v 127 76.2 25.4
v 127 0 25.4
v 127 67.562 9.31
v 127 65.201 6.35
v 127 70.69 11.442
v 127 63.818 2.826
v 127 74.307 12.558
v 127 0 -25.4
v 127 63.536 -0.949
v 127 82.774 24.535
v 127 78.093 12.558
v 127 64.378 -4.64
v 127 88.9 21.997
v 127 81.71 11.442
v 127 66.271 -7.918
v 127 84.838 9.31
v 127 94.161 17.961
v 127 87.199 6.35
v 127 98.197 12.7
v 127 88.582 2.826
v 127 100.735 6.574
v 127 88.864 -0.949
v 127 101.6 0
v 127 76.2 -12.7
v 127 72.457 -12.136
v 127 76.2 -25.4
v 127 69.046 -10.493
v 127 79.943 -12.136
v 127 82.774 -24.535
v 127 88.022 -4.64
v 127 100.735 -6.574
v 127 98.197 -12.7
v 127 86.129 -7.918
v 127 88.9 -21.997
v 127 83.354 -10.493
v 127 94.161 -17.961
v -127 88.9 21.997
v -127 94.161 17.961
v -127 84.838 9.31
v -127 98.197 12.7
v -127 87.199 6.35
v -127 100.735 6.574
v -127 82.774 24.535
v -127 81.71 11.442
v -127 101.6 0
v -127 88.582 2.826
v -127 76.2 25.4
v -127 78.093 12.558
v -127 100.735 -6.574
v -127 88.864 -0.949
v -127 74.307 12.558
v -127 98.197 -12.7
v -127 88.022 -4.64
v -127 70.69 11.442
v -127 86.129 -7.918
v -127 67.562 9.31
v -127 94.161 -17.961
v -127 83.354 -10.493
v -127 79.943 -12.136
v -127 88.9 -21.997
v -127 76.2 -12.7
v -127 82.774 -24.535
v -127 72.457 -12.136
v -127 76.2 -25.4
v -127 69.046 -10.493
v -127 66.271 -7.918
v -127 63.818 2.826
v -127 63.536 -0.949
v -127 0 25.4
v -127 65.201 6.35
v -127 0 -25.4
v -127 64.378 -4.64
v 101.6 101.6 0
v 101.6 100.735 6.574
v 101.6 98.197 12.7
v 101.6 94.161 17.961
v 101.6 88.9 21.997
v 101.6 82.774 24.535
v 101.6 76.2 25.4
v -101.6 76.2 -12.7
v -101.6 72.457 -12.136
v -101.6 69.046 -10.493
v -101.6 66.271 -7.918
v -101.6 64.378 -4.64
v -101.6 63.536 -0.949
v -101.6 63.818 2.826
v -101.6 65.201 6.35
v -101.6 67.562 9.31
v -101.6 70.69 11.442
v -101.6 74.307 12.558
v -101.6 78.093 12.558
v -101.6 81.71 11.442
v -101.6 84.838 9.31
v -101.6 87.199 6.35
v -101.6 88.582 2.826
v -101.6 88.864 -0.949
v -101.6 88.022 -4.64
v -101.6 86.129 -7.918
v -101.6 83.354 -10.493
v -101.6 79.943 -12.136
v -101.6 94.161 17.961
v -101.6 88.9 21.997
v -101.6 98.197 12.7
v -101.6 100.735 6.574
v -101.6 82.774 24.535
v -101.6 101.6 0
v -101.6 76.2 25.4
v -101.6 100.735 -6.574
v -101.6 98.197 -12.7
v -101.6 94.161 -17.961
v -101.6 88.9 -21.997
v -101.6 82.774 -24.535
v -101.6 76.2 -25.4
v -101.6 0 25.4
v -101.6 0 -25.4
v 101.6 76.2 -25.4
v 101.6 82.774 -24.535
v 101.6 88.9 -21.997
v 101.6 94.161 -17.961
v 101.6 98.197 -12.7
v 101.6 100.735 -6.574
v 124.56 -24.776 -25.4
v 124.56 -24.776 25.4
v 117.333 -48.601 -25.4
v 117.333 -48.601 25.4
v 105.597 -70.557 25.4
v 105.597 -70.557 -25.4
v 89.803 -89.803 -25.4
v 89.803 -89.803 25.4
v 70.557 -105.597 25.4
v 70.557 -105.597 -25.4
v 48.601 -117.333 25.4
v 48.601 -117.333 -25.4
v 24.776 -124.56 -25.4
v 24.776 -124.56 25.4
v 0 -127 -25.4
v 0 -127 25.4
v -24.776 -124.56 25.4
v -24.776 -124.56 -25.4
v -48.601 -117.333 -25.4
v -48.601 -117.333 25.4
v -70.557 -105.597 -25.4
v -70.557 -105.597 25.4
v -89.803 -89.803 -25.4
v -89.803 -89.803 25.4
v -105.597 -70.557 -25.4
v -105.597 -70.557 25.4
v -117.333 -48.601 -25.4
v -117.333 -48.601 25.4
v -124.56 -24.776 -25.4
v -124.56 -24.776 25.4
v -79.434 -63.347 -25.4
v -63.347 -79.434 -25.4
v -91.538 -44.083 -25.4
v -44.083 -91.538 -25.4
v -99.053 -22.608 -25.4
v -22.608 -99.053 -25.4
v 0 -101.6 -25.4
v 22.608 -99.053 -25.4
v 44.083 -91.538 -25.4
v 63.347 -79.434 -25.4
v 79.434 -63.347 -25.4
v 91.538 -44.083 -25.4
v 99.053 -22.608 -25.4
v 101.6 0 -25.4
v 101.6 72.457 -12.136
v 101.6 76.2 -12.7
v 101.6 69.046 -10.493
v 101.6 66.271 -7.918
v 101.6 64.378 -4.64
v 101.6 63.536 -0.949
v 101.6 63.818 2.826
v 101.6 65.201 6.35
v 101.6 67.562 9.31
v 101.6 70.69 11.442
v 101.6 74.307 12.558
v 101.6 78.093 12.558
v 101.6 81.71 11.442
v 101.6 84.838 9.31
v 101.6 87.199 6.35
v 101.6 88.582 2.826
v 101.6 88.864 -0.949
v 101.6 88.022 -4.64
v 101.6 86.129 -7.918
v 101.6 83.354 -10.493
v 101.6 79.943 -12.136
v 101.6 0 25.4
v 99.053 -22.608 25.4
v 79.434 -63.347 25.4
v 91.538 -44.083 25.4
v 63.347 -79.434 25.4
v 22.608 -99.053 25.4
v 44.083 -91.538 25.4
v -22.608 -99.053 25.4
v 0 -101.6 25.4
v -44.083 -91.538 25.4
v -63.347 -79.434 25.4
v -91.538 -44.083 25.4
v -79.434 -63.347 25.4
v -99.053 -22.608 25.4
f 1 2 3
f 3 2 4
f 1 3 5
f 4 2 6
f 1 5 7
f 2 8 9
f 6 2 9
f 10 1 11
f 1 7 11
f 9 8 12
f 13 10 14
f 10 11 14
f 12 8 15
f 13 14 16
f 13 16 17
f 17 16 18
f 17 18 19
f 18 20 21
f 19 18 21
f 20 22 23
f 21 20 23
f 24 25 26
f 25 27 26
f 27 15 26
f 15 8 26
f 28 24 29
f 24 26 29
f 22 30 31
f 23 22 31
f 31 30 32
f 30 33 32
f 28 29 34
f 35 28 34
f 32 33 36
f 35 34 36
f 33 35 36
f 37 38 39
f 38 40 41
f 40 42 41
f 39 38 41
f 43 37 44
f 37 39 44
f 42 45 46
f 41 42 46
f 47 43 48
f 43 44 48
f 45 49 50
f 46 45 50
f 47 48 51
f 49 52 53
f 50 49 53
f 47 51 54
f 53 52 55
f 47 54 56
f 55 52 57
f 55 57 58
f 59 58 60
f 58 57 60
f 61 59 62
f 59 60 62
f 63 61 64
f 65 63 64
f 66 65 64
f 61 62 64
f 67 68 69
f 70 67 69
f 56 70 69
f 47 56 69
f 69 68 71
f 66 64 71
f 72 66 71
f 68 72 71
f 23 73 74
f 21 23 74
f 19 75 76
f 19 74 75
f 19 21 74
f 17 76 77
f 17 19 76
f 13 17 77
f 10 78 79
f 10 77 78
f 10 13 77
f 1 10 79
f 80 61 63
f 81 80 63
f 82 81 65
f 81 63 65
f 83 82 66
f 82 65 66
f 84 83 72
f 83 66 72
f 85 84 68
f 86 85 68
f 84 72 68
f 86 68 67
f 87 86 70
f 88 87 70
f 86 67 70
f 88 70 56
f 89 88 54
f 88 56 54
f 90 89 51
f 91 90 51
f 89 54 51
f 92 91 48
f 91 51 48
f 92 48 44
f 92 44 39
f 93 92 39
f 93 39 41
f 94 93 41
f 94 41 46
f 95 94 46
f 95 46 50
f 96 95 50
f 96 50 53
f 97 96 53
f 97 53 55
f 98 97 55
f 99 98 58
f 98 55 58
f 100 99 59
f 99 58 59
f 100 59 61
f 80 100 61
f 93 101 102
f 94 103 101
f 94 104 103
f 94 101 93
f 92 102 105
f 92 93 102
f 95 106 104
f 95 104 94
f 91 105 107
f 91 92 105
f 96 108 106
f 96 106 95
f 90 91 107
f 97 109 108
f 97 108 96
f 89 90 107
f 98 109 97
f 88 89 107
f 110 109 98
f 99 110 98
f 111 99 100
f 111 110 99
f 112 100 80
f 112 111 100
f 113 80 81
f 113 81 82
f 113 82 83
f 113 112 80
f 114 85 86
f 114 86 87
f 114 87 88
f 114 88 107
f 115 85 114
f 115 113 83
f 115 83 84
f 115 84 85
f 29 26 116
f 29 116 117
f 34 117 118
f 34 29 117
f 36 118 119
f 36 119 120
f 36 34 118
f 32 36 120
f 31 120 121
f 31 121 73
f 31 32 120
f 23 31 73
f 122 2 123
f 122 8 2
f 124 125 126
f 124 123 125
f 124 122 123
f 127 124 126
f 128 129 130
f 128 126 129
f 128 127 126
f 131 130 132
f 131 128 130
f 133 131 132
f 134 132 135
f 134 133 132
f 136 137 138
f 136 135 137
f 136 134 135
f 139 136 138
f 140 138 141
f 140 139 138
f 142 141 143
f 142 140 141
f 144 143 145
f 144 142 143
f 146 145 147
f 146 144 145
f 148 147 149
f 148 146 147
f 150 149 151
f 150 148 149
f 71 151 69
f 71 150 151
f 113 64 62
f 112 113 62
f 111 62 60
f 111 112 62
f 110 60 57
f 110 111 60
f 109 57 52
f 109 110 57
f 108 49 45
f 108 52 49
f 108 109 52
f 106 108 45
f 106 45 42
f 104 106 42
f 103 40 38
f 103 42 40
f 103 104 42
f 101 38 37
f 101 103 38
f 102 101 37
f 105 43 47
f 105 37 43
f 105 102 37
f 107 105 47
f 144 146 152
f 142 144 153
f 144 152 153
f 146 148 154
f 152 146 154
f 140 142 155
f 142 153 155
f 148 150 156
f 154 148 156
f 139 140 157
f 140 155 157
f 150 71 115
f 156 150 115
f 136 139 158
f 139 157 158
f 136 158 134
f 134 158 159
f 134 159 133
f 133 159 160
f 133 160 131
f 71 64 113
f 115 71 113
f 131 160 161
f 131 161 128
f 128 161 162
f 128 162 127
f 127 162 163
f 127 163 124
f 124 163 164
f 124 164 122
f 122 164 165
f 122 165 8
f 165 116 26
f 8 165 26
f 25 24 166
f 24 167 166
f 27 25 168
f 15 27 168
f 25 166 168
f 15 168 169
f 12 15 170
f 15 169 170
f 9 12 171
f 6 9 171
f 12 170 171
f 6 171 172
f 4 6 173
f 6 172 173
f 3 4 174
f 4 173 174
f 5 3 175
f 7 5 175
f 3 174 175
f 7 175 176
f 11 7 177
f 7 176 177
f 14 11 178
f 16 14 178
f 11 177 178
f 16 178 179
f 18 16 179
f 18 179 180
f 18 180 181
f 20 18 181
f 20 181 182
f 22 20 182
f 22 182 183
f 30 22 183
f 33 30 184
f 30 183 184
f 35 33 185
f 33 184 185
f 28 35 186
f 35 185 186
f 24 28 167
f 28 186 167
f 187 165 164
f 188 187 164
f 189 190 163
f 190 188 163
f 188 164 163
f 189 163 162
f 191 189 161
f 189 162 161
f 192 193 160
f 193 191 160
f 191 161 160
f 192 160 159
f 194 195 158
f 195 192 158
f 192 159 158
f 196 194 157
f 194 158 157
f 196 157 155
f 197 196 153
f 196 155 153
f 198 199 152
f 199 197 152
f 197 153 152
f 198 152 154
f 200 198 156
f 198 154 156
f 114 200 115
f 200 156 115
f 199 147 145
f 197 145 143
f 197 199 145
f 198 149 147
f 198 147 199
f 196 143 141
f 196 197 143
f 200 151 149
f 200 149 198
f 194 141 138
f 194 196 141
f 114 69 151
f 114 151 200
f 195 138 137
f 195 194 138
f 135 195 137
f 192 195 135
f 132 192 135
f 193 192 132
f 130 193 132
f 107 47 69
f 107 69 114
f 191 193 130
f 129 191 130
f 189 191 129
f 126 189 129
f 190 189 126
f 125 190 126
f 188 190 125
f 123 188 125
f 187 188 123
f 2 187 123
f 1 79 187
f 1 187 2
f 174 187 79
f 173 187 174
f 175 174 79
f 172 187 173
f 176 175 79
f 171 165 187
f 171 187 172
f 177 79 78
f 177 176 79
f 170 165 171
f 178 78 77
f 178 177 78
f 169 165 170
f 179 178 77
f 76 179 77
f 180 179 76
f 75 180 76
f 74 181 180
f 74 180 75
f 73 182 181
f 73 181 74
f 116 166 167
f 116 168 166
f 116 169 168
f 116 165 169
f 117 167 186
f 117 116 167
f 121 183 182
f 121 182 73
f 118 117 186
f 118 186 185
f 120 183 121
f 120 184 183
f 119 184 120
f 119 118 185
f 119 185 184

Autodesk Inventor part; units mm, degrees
ref_plane "YZ Plane" through (0, 0, 0) normal (1, 0, 0) x (0, 1, 0)
ref_plane "XZ Plane" through (0, 0, 0) normal (0, 1, 0) x (-1, 0, 0)
ref_plane "XY Plane" through (0, 0, 0) normal (0, 0, 1) x (1, 0, 0)
sketch "Sketch1" plane through (0, 0, 0) normal (0, 0, 1) x (1, 0, 0)
  line L0 (-101.6, 101.6) -> (-101.6, 0)
  arc A0 (-101.6, 0) -> (101.6, 0) centre (0, 0) ccw
  line L1 (101.6, 0) -> (101.6, 101.6)
  line L2 (-127, 101.6) -> (-127, 0)
  arc A1 (-127, 0) -> (127, 0) centre (0, 0) ccw
  line L3 (127, 0) -> (127, 101.6)
  line L4 (-127, 101.6) -> (-101.6, 101.6)
  line L5 (101.6, 101.6) -> (127, 101.6)
  dimension "d0" = 101.6
  dimension "d1" = 101.6
  dimension "d2" = 25.4
extrude "Extrusion1" add sketch "Sketch1" along normal mid plane 50.8
full round fillet "Fillet1" first side at (-110.0667, 33.8667, 25.4) centre faces at (110.0667, 101.6, -8.4667) second side at (-110.0667, 33.8667, -25.4)
full round fillet "Fillet2" first side at (-118.5333, 33.8667, 25.4) centre faces at (-118.5333, 101.6, 8.4667) second side at (-118.5333, 33.8667, -25.4)
hole "Hole1" at (127, 76.2, 0) direction (-1, 0, 0) diameter 25.4 end through all
properties part number "Forl"
